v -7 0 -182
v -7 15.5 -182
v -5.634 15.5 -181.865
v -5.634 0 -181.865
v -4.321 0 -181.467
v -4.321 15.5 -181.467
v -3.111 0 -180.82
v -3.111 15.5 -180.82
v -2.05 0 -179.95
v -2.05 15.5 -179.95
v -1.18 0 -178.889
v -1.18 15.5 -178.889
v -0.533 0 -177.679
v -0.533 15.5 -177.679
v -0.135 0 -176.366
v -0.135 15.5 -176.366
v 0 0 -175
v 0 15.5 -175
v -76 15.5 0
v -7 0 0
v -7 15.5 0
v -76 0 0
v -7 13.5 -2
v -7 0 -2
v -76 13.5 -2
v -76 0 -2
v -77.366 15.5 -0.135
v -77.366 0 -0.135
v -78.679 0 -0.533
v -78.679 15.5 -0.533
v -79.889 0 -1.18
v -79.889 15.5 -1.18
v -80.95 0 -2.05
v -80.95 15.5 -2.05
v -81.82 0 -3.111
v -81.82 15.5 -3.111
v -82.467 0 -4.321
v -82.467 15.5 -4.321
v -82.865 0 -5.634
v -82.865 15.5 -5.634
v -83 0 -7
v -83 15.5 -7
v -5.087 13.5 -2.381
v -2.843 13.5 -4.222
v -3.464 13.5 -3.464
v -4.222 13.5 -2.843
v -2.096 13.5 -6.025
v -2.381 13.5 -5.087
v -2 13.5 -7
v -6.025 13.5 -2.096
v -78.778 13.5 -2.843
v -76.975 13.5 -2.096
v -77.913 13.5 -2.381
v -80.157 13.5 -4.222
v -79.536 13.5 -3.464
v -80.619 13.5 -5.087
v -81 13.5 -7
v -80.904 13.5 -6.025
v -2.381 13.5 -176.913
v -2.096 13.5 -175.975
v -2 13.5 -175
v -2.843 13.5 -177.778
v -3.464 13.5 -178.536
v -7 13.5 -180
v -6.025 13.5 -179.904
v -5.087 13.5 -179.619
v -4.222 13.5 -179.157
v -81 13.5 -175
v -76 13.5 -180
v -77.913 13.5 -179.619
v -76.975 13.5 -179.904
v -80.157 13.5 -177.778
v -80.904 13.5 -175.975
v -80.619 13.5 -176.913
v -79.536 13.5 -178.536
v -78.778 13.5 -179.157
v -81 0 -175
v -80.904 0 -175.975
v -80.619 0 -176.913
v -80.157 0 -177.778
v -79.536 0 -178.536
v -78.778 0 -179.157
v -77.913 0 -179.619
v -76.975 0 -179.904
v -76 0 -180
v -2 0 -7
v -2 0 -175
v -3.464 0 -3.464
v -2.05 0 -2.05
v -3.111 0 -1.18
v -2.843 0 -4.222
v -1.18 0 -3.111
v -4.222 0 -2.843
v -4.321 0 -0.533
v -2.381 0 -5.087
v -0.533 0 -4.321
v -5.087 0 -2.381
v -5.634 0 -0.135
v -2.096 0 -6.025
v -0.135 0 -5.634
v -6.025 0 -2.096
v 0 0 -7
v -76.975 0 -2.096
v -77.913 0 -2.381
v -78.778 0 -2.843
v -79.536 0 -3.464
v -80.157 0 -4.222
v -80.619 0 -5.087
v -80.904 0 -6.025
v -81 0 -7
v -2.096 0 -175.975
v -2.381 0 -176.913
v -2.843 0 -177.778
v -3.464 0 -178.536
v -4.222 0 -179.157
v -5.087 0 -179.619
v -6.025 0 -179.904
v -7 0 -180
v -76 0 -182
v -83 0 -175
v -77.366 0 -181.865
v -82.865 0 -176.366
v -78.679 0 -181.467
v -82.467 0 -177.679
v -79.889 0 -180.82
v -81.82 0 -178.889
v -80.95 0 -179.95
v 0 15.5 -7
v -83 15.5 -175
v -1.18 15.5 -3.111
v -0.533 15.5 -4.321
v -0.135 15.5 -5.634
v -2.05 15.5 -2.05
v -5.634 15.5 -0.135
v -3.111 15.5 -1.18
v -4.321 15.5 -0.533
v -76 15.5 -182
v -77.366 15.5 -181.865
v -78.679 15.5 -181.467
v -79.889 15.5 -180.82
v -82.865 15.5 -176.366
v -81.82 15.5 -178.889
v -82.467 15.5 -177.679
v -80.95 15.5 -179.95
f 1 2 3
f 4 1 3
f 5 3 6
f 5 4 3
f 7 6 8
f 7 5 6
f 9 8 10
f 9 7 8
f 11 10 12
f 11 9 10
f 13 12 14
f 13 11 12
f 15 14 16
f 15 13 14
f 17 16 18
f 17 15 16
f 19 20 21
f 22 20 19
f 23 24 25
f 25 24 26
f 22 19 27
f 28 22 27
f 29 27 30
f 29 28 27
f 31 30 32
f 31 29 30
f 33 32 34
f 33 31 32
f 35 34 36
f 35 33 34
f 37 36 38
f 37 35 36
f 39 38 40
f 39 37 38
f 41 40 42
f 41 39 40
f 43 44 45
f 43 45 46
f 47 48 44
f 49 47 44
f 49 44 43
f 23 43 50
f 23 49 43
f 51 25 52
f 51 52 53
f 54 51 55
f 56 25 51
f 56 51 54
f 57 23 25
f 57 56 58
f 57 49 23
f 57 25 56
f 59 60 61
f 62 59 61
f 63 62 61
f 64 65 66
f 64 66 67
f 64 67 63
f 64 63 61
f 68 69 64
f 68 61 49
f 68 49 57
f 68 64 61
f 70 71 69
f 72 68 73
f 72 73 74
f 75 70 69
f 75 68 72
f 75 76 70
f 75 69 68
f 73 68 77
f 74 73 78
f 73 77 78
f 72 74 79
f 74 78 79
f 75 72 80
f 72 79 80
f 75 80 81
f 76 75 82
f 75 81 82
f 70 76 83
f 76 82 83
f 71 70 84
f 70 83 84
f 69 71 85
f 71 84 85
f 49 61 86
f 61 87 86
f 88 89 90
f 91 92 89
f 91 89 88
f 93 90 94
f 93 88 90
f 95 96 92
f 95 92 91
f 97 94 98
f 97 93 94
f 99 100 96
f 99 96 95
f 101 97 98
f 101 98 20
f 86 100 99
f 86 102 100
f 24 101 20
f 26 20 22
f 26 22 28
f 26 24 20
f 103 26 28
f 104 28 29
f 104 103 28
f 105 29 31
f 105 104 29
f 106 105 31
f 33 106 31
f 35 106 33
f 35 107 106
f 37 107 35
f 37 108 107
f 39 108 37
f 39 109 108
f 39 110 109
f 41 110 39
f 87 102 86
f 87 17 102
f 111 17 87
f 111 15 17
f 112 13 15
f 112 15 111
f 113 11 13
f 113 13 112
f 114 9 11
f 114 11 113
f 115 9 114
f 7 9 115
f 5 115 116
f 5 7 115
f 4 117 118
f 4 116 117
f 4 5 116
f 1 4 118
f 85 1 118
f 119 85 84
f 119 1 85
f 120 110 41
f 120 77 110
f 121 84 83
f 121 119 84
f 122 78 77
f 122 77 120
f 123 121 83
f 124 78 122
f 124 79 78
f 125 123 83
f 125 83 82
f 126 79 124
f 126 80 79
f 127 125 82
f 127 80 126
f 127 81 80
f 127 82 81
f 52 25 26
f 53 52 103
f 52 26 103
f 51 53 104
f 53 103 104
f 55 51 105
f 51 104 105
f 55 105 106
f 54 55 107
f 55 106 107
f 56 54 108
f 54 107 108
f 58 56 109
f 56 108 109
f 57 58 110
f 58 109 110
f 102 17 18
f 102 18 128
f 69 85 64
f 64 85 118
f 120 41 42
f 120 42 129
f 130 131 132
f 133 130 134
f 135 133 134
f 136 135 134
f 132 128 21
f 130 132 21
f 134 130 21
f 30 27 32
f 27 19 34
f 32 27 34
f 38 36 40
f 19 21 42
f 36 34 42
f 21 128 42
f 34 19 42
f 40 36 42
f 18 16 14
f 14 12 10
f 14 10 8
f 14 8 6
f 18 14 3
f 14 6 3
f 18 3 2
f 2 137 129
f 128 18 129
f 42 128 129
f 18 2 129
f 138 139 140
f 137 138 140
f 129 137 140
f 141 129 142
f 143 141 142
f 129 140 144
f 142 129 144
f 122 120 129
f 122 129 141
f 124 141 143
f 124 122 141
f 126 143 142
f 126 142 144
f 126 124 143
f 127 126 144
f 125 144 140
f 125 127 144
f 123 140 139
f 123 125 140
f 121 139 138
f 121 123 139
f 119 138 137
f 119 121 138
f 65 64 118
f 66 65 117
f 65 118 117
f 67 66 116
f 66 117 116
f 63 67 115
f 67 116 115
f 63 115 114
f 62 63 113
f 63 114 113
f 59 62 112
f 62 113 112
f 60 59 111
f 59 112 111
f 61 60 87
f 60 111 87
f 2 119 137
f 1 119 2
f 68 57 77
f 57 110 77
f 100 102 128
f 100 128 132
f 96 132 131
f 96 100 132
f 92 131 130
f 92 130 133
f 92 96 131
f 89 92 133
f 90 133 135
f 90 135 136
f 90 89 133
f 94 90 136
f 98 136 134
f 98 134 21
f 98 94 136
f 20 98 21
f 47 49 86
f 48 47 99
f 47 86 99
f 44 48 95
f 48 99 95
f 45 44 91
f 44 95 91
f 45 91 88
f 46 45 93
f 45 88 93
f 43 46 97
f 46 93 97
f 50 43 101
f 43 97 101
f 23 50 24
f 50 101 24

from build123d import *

# Parameters (mm, degrees)
EXTRUDE_1_DEPTH = 15.5
SHELL_1_T       = -2


with BuildPart() as part:
    # Эскиз2 → Бобышка-Вытянуть1 (new body)
    with BuildSketch(Plane(origin=(0, 0, 0), x_dir=(1, 0, 0), z_dir=(0, 1, 0))):
        with BuildLine():
            Line((-7, 0), (-76, 0))
            ThreePointArc((-76, 0), (-80.949747468, 2.050252532), (-83, 7))
            Line((-83, 7), (-83, 175))
            ThreePointArc((-83, 175), (-80.949747468, 179.949747468), (-76, 182))
            Line((-76, 182), (-7, 182))
            ThreePointArc((-7, 182), (-2.050252532, 179.949747468), (0, 175))
            Line((0, 175), (0, 7))
            ThreePointArc((0, 7), (-2.050252532, 2.050252532), (-7, 0))
        make_face()
    extrude(amount=EXTRUDE_1_DEPTH)

    # Оболочка1
    shell_1_openings = [part.faces().sort_by_distance(p)[0] for p in [
        (-41.5, 0, -91),
    ]]
    offset(amount=SHELL_1_T, openings=shell_1_openings, kind=Kind.INTERSECTION)


solid = part.part
